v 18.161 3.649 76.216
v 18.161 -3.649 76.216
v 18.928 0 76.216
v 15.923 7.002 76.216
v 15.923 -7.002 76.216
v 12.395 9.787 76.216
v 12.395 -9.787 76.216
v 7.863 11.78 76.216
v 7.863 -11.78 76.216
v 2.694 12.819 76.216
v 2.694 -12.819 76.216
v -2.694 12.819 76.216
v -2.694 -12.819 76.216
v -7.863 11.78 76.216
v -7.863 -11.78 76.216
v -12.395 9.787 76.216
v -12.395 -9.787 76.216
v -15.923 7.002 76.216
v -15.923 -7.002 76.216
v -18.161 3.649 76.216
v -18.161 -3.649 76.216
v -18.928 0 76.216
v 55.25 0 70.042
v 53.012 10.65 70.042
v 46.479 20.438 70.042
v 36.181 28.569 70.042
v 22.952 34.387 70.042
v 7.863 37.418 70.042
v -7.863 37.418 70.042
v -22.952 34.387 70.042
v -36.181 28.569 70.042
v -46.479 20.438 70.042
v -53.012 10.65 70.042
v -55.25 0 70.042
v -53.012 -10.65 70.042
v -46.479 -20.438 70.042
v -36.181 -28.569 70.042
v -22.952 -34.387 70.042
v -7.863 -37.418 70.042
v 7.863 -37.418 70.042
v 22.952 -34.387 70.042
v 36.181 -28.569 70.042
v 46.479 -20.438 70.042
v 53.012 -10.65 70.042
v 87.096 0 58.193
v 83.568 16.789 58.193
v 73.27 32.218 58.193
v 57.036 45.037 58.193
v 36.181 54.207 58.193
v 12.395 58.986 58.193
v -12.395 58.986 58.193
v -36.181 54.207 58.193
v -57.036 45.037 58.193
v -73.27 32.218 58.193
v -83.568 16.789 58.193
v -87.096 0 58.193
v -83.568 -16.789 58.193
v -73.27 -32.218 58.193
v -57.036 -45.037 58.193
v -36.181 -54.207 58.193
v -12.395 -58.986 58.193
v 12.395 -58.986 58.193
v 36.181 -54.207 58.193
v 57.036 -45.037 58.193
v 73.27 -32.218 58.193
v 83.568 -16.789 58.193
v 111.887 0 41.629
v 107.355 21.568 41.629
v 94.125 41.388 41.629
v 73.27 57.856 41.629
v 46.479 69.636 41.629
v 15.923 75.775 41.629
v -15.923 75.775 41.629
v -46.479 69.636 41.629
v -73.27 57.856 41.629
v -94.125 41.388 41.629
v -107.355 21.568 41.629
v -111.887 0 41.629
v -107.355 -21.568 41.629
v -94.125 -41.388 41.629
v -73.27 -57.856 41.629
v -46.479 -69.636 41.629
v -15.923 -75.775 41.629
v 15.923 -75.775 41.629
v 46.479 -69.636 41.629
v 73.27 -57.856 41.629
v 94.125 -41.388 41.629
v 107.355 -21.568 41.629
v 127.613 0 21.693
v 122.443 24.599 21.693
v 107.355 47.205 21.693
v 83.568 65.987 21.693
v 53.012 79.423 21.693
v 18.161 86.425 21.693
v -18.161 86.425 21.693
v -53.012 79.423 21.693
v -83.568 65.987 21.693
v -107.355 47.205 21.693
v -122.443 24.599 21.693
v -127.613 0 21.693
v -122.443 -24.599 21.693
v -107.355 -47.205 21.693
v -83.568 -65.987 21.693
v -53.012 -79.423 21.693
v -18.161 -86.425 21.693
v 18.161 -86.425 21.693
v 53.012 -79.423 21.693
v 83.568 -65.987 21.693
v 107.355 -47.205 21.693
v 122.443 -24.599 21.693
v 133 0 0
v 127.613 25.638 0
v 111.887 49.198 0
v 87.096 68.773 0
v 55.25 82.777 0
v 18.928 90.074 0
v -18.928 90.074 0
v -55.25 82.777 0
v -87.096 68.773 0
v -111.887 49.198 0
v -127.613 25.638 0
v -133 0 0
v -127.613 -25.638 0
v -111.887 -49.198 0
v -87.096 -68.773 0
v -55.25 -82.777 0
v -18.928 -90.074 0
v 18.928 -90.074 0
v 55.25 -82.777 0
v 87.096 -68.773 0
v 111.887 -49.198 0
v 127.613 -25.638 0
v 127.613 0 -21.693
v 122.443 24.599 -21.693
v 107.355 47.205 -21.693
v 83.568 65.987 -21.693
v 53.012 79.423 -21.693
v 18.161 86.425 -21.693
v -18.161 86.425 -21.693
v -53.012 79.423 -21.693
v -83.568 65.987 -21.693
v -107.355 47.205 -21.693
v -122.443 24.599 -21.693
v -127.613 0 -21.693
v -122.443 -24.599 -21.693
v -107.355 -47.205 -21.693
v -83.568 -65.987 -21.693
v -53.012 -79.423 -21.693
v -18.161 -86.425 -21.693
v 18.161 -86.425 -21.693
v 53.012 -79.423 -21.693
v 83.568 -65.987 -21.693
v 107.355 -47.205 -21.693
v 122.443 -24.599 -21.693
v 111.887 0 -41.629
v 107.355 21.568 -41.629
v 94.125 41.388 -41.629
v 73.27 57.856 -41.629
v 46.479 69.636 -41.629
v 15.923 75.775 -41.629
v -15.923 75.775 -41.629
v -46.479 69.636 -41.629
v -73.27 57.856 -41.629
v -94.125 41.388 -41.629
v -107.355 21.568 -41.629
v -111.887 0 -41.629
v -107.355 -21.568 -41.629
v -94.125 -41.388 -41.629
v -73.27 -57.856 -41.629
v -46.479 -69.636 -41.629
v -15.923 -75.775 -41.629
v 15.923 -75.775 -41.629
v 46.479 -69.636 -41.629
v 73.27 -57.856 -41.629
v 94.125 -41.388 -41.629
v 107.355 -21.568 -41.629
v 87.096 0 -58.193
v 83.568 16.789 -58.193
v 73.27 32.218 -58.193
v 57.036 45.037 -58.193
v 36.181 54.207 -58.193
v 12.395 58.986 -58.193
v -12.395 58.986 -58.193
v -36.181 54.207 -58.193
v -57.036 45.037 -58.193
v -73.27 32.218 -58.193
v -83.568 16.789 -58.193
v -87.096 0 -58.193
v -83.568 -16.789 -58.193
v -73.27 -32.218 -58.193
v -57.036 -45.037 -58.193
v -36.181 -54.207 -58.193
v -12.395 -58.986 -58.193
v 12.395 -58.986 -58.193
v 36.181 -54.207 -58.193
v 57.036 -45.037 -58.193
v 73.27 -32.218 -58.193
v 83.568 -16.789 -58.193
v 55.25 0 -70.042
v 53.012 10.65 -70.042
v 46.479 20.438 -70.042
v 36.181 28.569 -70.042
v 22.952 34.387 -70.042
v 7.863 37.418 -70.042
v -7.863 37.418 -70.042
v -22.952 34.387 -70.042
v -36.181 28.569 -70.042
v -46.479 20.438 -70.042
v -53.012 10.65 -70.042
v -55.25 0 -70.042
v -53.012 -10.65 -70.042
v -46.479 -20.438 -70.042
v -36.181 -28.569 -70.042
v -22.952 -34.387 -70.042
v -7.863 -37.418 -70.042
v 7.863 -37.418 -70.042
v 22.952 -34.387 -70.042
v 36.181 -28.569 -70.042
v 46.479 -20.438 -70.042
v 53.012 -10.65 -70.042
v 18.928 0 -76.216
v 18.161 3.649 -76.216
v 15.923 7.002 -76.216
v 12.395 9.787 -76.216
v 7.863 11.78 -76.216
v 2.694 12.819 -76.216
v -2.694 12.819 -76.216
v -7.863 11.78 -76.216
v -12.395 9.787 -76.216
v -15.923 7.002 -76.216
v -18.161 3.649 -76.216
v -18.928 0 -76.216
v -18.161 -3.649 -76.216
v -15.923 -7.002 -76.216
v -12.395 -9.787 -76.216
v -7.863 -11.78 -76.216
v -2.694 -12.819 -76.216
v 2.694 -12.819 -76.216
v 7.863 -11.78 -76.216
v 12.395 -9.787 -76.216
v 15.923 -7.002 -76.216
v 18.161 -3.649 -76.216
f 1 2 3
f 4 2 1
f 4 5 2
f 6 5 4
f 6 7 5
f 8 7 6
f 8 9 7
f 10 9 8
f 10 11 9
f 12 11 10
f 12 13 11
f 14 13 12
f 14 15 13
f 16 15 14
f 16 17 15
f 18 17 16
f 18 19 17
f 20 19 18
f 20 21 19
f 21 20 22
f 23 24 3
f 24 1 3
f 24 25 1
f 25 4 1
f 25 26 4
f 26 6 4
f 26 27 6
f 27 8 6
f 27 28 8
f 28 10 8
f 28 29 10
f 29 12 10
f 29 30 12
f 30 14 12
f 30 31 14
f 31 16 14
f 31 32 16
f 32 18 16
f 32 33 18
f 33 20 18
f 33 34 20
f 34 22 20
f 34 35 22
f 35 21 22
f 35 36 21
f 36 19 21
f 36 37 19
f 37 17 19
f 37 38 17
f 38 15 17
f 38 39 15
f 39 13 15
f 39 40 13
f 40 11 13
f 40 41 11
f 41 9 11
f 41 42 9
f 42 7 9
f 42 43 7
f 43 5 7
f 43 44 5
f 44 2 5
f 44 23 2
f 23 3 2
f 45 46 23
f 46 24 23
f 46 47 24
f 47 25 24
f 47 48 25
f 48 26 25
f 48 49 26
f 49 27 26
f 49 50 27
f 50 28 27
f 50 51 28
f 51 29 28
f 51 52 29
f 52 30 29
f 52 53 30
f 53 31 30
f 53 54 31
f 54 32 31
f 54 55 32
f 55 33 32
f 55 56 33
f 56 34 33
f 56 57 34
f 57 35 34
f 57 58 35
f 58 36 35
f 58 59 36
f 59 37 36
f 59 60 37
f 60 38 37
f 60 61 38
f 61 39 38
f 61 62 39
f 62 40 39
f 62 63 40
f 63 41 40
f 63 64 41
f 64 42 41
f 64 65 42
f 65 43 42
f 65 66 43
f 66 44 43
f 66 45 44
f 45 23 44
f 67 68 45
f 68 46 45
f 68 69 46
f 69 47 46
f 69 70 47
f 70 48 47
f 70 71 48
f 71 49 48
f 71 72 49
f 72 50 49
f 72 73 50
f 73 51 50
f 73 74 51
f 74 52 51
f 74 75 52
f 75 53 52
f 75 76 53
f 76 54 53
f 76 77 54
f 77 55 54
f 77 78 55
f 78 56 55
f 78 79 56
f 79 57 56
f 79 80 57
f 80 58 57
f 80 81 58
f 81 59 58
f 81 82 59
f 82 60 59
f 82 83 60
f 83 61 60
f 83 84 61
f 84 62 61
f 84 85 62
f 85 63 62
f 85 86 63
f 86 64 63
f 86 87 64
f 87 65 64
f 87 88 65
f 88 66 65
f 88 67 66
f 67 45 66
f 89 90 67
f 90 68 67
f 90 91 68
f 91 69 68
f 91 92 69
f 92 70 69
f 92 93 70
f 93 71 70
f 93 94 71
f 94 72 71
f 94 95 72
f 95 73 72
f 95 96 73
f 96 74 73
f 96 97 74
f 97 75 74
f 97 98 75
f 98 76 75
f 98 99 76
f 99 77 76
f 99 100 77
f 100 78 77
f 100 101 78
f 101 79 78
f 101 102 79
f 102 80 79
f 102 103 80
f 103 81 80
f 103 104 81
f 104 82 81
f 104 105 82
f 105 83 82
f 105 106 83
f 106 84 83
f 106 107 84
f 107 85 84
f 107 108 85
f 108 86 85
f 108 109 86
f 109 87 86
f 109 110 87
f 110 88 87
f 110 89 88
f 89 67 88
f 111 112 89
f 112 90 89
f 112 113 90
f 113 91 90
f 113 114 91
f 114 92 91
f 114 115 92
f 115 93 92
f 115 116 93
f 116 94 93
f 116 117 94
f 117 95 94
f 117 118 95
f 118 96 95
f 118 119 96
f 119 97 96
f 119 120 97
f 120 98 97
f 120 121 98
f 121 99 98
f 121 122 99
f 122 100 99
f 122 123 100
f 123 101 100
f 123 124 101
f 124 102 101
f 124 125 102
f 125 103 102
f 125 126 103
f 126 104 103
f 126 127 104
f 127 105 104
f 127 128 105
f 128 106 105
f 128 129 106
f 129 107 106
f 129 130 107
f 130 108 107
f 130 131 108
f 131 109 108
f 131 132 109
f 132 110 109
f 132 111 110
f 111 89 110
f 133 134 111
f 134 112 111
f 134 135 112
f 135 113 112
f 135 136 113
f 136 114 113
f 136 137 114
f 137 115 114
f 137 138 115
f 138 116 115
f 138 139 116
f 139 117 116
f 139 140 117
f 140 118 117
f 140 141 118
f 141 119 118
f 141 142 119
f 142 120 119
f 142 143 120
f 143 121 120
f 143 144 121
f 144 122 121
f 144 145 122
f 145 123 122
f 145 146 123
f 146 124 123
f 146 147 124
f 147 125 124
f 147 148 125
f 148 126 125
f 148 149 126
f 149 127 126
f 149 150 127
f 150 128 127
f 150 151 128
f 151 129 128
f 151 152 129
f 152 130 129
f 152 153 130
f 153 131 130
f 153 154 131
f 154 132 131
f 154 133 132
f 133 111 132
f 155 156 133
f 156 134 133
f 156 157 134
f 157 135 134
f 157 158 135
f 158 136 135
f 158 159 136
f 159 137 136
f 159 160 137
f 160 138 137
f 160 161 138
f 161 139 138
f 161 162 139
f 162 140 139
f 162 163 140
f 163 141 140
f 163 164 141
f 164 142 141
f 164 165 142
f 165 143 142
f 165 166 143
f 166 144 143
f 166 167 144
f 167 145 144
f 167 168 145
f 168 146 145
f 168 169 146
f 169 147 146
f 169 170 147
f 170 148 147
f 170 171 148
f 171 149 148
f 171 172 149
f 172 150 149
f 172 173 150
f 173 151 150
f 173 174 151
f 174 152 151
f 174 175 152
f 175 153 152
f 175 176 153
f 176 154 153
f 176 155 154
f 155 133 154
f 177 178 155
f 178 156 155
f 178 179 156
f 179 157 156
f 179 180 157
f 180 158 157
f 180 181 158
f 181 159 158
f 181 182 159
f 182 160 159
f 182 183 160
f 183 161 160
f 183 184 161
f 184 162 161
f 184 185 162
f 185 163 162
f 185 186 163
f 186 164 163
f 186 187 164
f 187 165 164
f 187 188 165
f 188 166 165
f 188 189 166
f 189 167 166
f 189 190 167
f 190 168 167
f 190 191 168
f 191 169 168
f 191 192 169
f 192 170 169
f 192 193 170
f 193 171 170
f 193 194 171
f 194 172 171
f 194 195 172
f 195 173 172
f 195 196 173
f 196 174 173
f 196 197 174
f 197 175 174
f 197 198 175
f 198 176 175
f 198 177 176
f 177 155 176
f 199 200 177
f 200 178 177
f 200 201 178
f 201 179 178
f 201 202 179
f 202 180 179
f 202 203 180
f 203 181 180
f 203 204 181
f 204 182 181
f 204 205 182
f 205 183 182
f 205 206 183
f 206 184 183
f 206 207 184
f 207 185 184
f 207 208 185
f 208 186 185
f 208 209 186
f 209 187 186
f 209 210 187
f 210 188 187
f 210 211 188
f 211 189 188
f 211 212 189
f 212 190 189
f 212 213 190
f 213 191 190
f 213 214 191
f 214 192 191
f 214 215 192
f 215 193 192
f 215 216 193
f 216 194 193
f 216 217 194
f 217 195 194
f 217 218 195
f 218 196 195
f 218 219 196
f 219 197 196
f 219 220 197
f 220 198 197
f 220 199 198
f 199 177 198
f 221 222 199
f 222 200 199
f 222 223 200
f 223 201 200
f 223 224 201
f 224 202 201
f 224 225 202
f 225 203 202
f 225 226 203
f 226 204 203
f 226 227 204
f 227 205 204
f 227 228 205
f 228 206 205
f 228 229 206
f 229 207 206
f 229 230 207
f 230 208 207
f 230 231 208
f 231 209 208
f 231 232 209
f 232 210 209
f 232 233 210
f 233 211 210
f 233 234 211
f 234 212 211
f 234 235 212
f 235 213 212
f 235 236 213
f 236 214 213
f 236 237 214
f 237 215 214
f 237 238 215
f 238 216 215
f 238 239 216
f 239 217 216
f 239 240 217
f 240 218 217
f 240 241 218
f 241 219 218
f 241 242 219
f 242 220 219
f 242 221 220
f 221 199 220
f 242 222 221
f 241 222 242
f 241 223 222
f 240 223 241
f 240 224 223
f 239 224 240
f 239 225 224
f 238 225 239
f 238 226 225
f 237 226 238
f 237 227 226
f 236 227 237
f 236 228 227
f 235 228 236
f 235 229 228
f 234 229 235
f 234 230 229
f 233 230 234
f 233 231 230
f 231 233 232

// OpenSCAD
// Generated by SolidPython 1.0.1 on 2020-07-29 00:46:54


scale(v = [19, 13, 11]) {
	sphere(r = 7);
}
/***********************************************
*********      SolidPython code:      **********
************************************************
 
# import packages: SolidPython
from solid import *
from solid.utils import *
from itertools import chain, combinations, permutations


class Resize:

    def __init__(self, scad_file):
        self.scad_file = scad_file
        #self.scad_file = import_scad(scad_file)
        # cone/cylinder param:
        self.r1 = 0
        self.r2 = 0
        self.h = 0
        # rectangular prism param:
        self.w = 0
        self.l = 0
        # ellipse param:
        self.r = 0

    # import OpenScad code (file name corresponds to shape)


    # classify shape + parameters
    def assign(self, param1, param2, param3):
        if self.scad_file == 'cone.scad':
            self.r1 = param1
            self.r2 = param2
            self.h = param3
        elif self.scad_file == 'cylinder.scad':
            self.r1 = param1
            self.r2 = param2
            self.h = param3
        elif self.scad_file == 'rectangularPrism.scad':
            self.h = param1
            self.l = param2
            self.w = param3
        else:
            self.r = param1
            self.h = param2

    # resize parameters
    def iterate(self):
        x = range(3, 20, 2)
        i = 1
        if self.scad_file == 'cone.scad':
            tempList = list(permutations(x, 2))
            for temp in tempList:
                param1 = temp[0]
                param2 = temp[1]
                filepath = 'produced_scad_files/' + 'cone' + str(param1) + '_' + str(param2) + '_' + '.scad'
                scad_render_to_file(cylinder(h=param1, r1=param2, r2=0), filepath)

        elif self.scad_file == 'cylinder.scad':
            tempList = list(permutations(x, 3))
            for temp in tempList:
                param1 = temp[0]
                param2 = temp[1]
                filepath = 'produced_scad_files/' + 'cylinder' + str(param1) + '_' + str(param2) + '_' + '.scad'
                scad_render_to_file(cylinder(h=param1, r1=param2, r2=param2), filepath)

        elif self.scad_file == 'rectangularPrism.scad':
            tempList = list(permutations(x, 3))
            for temp in tempList:
                param1 = temp[0]
                param2 = temp[1]
                param3 = temp[2]
                filepath = 'produced_scad_files/' + 'rectangularPrism' + str(param1) + '_' + str(param2) + '_' + str(
                    param3) + '.scad'
                scad_render_to_file(cube(size=(param1, param2, param3)), filepath)

        elif self.scad_file == 'ellipse.scad':
            tempList = list(permutations(x, 4))
            for temp in tempList:
                param1 = temp[0]
                param2 = temp[1]
                param3 = temp[2]
                param4 = temp[3]
                filepath = 'produced_scad_files/' + 'ellipse' + str(param1) + '_' + str(param2) + '_' + str(param3) + '_' + str(param4) + '.scad'
                scad_render_to_file(scale([param1, param2, param3])(sphere(r=param4)), filepath)

    def render_to_scadfile(self):
        scad_render_to_file(scad, 'example.scad') 
 
************************************************/
